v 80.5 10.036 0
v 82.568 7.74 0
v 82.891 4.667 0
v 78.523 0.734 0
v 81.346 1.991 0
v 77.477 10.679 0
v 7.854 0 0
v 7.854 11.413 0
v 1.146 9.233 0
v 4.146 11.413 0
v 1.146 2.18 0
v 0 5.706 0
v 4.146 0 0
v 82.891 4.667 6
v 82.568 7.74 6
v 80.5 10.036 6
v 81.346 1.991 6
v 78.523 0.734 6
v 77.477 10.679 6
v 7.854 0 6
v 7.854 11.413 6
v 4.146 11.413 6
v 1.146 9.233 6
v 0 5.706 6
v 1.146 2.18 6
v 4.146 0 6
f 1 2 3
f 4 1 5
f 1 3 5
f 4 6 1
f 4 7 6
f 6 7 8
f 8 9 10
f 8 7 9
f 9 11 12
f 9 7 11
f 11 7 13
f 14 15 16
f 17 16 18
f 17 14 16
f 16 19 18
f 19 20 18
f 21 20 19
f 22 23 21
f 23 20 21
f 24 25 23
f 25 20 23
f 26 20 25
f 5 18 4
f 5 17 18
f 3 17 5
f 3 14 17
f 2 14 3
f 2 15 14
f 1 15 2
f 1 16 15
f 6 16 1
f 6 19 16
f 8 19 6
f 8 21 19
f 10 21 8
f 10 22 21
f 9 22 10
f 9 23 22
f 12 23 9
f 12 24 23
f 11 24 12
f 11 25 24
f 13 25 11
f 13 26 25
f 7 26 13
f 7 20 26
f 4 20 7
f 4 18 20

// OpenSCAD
$fn = 32;

// ----------------------------------------------------------------------
// Lever arm: two bosses 12 and 10 mm, 45 mm between centres
// ----------------------------------------------------------------------

// --- parameters (mm) ---
profile_height = 6;       // extrusion height
profile_points = 13;      // points of the closed outline

profile = [[0, 5.706], [1.146, 2.18], [4.146, 0], [7.854, 0], [78.523, 0.734], [81.346, 1.991], [82.891, 4.667], [82.568, 7.74], [80.5, 10.036], [77.477, 10.679], [7.854, 11.413], [4.146, 11.413], [1.146, 9.233]];  // single closed polygon, 13 points, counter clockwise

// --- the one profile operation ---
linear_extrude(height = profile_height) polygon(points = profile);
